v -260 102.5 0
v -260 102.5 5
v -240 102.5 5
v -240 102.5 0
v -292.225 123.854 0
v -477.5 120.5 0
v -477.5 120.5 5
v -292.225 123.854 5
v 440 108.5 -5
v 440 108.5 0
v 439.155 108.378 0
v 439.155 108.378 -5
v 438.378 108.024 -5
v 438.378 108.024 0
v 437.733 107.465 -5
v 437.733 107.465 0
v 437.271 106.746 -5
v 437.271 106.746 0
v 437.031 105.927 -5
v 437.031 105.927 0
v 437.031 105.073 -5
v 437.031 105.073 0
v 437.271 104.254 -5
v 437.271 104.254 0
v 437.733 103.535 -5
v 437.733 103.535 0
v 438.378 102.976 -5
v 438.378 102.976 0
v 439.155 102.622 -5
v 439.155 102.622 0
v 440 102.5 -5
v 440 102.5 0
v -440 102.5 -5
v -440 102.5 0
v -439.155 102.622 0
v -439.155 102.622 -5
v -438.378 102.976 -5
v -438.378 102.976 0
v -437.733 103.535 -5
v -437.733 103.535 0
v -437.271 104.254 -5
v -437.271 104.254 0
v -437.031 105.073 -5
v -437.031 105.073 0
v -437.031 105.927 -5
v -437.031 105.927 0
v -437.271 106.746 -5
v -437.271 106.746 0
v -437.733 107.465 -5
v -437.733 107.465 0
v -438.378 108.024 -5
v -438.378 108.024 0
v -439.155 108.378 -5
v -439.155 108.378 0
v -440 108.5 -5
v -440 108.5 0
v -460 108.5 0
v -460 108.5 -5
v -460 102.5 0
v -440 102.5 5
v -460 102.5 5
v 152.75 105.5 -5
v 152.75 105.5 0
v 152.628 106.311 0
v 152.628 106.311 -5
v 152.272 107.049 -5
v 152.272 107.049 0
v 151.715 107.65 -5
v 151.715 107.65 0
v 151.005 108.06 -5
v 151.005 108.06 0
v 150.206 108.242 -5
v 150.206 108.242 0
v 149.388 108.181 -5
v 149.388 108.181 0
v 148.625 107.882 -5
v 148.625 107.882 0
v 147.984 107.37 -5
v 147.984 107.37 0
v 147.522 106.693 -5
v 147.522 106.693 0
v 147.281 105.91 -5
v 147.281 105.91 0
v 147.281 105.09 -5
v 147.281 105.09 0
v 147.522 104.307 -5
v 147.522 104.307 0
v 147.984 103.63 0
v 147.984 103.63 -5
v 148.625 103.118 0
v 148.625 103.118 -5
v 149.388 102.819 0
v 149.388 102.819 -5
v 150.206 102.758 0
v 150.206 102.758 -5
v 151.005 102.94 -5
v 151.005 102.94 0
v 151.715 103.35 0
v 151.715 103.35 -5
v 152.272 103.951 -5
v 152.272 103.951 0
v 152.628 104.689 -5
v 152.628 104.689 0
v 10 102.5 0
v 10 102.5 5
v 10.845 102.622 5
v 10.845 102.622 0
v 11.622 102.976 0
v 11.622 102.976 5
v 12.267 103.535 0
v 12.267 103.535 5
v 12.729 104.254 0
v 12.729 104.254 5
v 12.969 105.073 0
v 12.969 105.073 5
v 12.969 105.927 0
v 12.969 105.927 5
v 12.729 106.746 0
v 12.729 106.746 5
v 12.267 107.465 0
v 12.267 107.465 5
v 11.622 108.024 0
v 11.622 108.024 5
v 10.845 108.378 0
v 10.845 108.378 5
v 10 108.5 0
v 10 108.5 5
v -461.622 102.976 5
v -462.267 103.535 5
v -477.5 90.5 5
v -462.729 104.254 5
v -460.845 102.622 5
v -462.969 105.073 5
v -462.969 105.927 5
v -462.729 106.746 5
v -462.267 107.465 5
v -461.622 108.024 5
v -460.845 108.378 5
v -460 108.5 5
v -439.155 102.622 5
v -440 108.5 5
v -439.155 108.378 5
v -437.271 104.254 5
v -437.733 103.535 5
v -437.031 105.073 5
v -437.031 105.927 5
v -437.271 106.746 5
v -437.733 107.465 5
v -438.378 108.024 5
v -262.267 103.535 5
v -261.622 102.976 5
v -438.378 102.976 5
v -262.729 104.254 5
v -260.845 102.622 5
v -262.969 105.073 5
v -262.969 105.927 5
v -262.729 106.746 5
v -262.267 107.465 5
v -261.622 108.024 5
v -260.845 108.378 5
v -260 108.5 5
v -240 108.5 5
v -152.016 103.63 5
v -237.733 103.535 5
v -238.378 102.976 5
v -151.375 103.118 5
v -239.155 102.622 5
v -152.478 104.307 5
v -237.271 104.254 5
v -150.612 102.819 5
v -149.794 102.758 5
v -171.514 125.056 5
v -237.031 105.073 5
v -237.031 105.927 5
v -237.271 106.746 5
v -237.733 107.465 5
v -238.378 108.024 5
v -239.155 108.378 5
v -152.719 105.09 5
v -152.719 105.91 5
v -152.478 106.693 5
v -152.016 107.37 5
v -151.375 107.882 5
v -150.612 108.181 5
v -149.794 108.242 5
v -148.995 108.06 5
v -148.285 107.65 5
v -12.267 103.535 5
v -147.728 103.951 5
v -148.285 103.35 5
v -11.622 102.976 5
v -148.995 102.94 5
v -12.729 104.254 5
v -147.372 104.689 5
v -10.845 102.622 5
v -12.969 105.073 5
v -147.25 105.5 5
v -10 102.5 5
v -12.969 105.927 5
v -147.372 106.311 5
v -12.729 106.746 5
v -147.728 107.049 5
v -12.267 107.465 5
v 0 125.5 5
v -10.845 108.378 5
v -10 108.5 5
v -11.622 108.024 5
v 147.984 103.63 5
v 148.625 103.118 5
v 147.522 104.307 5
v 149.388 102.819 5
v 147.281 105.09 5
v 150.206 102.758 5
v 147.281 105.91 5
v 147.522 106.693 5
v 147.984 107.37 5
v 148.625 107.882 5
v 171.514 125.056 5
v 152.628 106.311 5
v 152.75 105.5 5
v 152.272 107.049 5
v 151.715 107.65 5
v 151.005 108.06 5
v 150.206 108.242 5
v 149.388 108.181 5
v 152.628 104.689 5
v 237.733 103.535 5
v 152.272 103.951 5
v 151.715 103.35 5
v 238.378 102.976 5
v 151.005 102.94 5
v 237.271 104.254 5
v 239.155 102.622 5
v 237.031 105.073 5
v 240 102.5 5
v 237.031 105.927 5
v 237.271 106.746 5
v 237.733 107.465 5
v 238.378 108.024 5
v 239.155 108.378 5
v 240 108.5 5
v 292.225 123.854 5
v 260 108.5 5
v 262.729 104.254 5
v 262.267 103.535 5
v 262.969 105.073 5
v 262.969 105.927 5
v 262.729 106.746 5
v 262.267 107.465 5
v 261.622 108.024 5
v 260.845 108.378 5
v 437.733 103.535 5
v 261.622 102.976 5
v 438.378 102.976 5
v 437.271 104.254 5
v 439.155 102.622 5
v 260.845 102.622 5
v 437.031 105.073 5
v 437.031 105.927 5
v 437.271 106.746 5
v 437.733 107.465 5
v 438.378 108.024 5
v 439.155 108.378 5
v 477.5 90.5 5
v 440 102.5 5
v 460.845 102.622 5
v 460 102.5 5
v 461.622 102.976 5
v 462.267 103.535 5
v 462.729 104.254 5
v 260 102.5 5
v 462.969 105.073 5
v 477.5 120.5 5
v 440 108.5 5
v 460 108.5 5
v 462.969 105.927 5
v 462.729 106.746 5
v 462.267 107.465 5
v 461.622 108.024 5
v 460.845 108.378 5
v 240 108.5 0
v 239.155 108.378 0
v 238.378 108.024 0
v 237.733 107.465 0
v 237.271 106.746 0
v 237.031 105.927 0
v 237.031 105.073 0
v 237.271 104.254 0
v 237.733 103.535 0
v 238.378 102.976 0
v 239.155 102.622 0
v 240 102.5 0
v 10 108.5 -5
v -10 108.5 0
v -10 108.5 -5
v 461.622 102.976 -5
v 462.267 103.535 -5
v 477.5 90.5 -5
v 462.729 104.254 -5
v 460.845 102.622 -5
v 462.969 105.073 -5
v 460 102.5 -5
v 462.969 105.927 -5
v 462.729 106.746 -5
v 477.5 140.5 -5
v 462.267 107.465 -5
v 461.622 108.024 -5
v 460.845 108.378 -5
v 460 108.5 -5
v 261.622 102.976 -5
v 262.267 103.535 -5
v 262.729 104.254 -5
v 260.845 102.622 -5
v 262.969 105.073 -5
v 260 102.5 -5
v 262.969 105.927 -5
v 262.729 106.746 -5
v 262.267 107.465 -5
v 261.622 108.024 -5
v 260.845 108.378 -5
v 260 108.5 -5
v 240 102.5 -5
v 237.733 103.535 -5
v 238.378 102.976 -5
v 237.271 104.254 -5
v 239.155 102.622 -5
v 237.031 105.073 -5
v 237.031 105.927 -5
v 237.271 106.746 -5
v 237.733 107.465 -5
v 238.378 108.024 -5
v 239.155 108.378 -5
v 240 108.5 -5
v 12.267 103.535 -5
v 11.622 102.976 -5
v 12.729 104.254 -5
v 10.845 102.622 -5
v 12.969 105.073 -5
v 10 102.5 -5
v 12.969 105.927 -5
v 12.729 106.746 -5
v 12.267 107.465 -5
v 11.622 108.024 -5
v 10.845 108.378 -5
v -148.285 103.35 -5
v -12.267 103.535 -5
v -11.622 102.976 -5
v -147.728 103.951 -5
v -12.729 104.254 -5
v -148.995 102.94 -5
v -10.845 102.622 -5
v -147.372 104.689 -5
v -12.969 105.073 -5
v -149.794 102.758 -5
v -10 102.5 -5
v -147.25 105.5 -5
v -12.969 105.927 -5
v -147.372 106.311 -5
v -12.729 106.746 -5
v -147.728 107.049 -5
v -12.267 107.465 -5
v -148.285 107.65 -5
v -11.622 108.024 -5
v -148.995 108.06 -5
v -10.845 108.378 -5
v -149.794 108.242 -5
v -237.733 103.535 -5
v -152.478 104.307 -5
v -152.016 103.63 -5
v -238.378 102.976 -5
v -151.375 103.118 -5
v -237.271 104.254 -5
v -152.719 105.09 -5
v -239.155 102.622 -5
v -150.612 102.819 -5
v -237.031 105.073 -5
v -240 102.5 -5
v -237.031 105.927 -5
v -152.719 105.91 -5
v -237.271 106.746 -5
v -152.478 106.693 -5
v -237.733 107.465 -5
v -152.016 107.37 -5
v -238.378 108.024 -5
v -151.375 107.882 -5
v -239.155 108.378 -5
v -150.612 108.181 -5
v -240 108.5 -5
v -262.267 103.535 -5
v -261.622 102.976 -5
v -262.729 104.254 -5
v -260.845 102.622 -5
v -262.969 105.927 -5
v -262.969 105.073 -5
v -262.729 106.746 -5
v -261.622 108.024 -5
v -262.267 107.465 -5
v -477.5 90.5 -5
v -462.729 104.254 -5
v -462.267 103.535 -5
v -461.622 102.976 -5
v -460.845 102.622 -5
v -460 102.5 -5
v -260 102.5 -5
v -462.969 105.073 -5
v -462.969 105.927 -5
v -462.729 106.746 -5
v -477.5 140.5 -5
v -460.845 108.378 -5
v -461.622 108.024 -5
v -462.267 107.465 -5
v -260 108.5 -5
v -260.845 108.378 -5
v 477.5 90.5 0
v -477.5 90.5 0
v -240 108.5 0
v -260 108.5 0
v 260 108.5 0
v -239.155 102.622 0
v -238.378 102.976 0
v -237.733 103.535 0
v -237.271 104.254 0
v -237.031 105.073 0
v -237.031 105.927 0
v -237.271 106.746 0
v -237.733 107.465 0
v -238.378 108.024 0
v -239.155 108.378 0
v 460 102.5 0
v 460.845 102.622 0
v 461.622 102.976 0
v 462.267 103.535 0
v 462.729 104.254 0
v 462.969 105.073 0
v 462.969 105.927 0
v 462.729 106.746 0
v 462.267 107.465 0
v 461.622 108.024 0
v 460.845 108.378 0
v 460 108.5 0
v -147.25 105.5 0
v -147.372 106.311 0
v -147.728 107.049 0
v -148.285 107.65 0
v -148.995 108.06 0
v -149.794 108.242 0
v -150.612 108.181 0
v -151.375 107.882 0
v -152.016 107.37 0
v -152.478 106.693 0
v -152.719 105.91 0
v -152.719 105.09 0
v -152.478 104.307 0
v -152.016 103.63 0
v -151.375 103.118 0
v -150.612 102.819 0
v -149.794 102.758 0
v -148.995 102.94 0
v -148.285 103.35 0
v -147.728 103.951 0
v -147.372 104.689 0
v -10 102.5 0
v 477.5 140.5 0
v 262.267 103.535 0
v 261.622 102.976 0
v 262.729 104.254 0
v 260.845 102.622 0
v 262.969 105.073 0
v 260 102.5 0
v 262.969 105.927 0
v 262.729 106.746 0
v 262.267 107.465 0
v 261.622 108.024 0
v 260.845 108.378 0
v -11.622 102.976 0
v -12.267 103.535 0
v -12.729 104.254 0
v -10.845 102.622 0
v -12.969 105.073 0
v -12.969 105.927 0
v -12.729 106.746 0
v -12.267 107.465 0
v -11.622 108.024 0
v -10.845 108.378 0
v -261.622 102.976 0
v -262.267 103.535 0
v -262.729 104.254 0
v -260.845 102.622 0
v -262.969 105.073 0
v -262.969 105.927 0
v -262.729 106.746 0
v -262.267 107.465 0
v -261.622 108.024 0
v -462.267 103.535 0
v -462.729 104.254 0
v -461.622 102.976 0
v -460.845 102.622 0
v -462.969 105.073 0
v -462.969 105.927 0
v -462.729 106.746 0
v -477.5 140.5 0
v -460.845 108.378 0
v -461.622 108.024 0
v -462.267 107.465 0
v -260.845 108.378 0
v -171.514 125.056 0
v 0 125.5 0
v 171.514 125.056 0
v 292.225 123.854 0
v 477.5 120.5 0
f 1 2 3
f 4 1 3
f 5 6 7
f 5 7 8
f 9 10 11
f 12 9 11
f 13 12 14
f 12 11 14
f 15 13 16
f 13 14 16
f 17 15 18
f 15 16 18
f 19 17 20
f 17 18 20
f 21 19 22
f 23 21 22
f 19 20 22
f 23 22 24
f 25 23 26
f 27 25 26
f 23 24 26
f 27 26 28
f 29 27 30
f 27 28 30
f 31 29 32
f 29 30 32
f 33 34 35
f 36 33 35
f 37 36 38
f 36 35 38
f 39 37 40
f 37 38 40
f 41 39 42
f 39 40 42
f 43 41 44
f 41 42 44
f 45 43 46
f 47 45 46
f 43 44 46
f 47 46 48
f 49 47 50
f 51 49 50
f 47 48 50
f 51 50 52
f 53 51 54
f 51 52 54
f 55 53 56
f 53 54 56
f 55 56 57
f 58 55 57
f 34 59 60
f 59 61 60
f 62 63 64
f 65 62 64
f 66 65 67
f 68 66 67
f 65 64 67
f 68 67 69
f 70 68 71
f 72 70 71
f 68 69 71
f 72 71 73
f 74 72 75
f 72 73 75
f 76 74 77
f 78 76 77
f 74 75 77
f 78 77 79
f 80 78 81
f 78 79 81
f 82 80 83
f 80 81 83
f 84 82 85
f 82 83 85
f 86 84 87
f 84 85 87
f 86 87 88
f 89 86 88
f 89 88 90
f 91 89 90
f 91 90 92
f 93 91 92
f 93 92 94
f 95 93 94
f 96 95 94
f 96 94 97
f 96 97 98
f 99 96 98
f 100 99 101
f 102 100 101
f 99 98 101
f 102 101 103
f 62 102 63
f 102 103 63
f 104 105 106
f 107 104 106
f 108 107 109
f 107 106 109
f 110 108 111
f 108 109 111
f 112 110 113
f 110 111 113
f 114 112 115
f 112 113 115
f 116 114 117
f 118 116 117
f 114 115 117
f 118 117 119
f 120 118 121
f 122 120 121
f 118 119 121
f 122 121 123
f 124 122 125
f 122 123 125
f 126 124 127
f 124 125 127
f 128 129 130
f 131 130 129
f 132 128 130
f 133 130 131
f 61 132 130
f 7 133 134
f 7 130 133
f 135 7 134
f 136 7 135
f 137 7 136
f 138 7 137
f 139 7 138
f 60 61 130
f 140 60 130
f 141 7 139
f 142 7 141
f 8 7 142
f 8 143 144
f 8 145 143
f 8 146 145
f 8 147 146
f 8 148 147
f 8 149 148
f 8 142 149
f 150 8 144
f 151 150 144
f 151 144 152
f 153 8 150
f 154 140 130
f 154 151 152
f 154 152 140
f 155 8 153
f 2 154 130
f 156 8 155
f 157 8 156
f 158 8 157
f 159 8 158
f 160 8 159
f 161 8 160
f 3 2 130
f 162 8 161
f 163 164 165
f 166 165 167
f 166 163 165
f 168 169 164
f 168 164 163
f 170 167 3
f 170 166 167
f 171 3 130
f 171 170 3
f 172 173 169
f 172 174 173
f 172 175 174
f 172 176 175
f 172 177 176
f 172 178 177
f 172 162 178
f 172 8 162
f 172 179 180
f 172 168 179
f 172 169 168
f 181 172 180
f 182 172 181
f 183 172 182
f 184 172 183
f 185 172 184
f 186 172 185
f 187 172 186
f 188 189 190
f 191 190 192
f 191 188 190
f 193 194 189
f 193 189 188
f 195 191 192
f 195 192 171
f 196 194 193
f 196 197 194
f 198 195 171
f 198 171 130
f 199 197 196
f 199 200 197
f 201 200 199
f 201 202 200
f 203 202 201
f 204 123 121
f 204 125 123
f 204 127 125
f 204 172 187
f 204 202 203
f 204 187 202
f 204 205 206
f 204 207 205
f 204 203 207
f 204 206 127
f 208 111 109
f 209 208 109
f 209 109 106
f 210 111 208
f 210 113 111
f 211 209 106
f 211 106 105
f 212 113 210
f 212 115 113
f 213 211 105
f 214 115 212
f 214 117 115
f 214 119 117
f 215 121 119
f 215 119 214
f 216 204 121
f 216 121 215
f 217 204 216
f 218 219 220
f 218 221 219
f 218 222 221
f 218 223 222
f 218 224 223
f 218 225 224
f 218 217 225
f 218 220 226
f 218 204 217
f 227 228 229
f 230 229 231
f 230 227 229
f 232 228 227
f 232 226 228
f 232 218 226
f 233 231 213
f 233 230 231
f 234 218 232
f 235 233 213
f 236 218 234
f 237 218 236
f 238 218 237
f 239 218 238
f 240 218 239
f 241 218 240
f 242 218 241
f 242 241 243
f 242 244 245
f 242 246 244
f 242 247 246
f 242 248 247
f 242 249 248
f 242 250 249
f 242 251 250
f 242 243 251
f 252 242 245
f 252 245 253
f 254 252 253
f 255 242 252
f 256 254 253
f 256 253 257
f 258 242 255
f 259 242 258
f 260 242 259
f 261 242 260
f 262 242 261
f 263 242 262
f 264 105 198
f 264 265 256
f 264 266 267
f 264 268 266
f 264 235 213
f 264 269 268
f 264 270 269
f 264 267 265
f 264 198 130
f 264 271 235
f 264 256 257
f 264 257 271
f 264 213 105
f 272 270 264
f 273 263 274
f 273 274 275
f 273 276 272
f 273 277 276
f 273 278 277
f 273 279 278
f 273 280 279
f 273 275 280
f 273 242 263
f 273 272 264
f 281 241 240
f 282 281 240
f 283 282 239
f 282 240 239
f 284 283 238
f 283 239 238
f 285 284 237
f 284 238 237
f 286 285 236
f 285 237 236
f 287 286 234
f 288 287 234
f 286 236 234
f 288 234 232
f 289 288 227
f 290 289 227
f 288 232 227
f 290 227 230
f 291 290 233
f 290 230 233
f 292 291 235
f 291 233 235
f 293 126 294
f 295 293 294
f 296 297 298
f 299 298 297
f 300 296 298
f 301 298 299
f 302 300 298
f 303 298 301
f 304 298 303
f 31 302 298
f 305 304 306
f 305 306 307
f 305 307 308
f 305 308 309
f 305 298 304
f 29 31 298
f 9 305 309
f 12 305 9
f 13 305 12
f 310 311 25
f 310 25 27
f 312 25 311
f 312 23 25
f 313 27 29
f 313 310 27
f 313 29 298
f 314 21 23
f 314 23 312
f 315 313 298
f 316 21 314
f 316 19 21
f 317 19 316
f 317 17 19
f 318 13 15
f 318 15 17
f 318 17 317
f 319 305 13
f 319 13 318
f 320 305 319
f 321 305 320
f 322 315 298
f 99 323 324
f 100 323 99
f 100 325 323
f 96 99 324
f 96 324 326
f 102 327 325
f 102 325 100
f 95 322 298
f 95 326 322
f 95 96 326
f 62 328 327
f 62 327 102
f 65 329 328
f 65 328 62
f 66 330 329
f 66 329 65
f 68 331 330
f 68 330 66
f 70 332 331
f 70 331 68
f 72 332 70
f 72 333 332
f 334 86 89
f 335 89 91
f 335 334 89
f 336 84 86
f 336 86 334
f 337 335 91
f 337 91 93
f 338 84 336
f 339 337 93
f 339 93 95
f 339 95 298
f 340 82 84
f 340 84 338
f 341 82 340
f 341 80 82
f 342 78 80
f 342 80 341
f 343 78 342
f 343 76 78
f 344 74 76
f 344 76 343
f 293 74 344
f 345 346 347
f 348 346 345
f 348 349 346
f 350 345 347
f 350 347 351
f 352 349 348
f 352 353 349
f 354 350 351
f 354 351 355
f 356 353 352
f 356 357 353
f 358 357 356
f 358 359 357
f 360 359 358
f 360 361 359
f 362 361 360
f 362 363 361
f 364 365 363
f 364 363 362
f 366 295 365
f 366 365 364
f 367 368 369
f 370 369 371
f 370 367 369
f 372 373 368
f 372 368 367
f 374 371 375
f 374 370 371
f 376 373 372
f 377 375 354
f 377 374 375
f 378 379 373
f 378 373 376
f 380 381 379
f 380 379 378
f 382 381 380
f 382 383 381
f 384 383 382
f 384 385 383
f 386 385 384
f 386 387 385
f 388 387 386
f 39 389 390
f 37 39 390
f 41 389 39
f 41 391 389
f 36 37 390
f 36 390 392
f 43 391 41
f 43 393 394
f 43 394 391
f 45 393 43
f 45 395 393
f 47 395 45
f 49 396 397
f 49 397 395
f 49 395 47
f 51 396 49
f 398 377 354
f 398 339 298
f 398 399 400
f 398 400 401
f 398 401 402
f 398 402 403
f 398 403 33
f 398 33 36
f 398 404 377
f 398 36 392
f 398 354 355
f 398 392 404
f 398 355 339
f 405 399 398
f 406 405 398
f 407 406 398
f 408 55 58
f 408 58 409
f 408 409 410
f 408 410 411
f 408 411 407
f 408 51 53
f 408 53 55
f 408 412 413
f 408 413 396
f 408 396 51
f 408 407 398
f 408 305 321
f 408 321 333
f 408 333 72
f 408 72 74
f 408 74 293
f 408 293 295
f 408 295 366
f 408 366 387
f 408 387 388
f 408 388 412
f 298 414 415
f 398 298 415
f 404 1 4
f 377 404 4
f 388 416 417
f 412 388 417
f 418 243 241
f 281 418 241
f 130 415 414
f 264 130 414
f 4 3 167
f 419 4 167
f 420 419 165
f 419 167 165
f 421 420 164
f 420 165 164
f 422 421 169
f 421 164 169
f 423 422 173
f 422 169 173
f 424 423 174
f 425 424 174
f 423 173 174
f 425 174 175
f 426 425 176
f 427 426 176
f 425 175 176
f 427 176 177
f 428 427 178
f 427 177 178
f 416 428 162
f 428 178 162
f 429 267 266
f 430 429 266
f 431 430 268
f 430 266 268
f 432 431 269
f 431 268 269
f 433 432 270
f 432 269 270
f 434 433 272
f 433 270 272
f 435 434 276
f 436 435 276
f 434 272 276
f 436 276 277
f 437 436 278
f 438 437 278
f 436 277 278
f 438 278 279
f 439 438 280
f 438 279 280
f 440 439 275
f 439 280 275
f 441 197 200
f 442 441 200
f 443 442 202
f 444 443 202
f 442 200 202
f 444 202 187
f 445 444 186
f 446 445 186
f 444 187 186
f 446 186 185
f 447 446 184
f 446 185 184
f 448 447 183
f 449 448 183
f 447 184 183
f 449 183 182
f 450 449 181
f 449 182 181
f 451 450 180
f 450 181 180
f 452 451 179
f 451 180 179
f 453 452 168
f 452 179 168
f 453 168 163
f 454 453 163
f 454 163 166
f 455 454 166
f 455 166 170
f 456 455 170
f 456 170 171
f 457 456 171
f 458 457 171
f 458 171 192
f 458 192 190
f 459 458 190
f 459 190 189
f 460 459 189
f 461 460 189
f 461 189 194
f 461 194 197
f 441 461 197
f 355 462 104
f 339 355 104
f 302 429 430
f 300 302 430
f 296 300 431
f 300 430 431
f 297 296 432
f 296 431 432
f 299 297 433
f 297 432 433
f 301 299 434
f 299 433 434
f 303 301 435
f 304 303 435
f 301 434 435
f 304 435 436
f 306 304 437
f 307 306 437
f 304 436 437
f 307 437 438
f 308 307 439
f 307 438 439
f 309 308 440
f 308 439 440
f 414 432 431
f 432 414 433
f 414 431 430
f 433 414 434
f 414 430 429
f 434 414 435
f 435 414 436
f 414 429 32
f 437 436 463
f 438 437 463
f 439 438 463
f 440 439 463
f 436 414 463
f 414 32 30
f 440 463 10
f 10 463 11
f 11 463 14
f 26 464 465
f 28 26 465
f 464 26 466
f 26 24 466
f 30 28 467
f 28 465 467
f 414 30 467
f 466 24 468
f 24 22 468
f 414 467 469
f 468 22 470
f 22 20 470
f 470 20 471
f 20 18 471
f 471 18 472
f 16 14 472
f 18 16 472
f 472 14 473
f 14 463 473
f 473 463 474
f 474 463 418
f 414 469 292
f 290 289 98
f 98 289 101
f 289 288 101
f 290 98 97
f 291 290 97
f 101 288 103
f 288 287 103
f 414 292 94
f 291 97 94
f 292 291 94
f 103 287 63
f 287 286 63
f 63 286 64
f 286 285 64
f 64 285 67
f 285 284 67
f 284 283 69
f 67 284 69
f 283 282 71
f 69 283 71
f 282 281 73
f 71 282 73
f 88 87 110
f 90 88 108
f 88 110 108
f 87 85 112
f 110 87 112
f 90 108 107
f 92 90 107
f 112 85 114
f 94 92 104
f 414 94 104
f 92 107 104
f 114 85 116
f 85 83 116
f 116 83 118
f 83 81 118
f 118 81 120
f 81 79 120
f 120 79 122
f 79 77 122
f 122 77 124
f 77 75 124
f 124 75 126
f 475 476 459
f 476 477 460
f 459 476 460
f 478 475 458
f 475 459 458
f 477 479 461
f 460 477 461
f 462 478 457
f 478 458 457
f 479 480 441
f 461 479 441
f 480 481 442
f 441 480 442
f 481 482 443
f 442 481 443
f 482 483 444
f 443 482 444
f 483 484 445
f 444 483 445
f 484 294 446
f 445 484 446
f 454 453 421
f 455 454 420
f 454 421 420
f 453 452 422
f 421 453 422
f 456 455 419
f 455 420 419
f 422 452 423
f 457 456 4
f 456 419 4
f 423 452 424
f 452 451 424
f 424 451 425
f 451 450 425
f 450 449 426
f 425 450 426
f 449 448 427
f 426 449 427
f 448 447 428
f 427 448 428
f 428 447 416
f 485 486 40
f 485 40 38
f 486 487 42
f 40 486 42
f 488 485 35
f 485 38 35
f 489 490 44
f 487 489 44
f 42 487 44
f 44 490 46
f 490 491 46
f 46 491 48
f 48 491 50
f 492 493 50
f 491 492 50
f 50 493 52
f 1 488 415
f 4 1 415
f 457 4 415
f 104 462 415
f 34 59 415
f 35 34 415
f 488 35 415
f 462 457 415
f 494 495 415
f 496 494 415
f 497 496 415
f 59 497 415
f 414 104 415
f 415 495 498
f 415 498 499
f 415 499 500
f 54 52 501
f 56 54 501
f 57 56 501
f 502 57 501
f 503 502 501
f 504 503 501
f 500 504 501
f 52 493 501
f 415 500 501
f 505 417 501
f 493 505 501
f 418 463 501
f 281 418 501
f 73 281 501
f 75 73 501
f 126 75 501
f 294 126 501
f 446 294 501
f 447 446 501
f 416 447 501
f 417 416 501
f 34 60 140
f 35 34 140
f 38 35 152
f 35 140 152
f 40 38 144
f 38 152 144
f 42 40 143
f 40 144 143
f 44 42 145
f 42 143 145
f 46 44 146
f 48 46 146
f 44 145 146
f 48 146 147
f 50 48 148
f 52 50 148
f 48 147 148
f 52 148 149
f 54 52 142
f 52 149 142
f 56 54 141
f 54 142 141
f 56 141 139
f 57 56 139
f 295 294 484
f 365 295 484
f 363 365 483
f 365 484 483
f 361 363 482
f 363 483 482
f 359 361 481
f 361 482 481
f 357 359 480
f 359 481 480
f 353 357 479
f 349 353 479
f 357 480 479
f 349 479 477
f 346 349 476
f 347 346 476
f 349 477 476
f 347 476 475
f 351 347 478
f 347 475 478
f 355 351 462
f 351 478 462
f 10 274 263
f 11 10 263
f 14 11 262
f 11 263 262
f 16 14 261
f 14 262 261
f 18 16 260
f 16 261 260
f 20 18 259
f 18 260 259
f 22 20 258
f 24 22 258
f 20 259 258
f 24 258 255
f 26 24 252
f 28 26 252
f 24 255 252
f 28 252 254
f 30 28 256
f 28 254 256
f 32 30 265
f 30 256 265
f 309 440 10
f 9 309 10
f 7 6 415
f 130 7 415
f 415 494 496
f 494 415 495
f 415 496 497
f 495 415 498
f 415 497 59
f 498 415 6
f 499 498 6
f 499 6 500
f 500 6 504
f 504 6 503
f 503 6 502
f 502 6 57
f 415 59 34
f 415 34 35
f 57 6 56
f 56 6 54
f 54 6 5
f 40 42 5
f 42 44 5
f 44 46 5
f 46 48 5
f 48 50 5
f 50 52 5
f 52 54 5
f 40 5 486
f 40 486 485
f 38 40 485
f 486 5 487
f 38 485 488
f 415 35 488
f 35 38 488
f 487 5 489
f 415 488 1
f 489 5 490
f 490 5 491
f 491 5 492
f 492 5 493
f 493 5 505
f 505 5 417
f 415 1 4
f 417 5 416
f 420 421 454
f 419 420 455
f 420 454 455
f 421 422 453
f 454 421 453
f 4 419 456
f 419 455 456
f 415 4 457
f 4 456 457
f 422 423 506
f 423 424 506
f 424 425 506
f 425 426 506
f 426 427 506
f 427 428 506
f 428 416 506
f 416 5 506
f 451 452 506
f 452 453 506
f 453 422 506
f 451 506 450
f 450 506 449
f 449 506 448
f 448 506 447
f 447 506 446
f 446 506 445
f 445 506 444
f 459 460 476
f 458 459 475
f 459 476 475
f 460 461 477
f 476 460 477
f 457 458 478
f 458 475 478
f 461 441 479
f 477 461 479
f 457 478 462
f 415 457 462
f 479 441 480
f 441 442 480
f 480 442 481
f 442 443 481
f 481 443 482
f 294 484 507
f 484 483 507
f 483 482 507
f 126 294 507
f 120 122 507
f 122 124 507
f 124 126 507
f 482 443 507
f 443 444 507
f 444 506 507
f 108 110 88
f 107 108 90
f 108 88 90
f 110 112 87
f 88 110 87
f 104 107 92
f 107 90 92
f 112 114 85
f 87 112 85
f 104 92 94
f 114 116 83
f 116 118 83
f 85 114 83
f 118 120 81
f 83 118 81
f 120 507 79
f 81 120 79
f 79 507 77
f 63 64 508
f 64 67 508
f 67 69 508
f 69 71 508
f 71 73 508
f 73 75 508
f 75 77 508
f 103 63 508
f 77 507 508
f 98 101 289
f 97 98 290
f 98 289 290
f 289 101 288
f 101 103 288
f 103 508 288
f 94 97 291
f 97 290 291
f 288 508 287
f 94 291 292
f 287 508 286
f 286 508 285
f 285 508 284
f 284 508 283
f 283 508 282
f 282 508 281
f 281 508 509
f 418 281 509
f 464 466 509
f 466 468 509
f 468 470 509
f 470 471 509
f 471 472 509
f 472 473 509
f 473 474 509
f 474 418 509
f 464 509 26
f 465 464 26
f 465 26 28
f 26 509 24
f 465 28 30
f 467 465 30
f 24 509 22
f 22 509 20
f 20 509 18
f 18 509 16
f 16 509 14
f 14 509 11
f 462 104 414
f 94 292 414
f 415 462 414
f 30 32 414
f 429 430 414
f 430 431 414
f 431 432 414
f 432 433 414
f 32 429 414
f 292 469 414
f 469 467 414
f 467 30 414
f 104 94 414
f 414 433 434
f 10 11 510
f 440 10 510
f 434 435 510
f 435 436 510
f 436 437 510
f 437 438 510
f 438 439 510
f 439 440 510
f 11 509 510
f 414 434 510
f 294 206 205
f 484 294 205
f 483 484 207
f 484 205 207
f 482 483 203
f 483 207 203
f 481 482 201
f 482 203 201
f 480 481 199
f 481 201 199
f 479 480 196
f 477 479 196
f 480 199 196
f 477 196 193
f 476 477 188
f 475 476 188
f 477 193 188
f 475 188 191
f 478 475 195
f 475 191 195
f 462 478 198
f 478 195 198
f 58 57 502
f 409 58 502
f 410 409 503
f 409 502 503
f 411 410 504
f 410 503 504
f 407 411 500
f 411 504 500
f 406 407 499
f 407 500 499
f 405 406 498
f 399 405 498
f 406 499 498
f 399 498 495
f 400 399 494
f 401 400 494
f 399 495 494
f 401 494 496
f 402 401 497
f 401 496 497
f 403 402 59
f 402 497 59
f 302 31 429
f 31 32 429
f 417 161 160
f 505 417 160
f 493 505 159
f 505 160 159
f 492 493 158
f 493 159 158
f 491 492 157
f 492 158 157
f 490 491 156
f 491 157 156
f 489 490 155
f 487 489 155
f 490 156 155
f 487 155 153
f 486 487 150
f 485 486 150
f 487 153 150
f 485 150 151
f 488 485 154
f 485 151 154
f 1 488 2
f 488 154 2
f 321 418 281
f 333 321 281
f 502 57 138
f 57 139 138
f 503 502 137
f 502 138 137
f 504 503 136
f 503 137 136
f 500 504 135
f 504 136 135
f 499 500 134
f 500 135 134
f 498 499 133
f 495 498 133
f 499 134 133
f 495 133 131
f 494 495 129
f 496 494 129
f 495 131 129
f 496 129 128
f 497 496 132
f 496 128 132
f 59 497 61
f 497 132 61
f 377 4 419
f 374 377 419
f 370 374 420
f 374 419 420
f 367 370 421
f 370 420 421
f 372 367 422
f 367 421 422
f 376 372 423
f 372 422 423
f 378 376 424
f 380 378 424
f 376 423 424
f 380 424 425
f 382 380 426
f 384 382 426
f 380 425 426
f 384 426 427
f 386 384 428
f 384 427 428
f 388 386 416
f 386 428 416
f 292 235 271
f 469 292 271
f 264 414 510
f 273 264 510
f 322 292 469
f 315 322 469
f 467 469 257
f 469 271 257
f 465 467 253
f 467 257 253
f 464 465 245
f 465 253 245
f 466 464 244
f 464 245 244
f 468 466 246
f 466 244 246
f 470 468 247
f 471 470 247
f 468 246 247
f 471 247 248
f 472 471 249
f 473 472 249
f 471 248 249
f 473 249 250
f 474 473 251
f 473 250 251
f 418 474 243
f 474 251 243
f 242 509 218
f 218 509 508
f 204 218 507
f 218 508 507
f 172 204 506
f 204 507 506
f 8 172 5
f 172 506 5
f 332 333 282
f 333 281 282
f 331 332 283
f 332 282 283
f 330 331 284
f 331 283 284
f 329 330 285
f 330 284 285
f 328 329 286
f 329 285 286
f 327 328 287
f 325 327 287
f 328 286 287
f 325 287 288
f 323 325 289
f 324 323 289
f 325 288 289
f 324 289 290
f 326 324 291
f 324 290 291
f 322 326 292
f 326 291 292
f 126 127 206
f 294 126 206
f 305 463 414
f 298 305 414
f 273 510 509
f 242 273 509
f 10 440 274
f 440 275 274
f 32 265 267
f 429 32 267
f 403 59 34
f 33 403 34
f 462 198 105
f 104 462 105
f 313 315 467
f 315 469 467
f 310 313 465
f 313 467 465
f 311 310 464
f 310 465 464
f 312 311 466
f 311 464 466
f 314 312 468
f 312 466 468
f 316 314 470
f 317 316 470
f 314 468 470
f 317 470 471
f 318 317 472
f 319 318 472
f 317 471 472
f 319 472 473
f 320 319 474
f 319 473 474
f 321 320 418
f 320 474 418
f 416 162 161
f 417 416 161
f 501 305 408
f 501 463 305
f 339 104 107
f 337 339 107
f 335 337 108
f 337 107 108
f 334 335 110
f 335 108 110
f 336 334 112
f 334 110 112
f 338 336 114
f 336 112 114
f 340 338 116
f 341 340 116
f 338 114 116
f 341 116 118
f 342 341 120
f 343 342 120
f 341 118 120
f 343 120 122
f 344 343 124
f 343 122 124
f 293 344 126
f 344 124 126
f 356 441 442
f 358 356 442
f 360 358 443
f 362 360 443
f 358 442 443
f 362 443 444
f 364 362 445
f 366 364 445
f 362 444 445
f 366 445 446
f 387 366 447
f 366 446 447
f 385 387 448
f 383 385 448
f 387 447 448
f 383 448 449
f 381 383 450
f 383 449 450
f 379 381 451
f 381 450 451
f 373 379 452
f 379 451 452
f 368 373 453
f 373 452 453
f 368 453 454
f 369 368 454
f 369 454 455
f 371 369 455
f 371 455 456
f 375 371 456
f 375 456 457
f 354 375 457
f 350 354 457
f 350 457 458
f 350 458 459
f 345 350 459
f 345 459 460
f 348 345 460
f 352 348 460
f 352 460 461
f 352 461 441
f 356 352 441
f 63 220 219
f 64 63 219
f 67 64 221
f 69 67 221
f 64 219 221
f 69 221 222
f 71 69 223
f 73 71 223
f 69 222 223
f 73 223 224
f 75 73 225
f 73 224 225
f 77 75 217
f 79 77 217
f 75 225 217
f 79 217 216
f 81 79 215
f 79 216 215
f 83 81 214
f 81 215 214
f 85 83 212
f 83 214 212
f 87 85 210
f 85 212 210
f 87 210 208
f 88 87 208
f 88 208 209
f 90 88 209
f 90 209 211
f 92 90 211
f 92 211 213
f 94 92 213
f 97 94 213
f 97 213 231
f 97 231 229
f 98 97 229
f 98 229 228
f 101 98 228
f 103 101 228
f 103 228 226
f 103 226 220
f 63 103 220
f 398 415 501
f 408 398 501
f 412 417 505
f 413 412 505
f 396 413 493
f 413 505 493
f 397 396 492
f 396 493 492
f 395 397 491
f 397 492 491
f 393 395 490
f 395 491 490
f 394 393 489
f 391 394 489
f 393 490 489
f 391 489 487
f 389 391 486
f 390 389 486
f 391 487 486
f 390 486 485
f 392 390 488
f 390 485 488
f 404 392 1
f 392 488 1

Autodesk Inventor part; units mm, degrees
ref_plane "YZ Plane" through (0, 0, 0) normal (1, 0, 0) x (0, 1, 0)
ref_plane "XZ Plane" through (0, 0, 0) normal (0, 1, 0) x (-1, 0, 0)
ref_plane "XY Plane" through (0, 0, 0) normal (0, 0, 1) x (1, 0, 0)
sketch "Sketch1" plane through (0, 0, 0) normal (0, 0, 1) x (1, 0, 0)
  line L0 (-327.5, -120) -> (327.5, -120) construction
  line L1 (327.5, -120) -> (327.5, 120) construction
  line L2 (181.0324, 120) -> (-327.5, 120) construction
  line L3 (-327.5, 120) -> (-327.5, -120) construction
  line L4 (-327.5, -120) -> (327.5, 120) construction
  line L5 (327.5, -120) -> (-327.5, 120) construction
  line L6 (-327.5, 120) -> (-327.5, 122.5) construction
  line L7 (-145.4605, 120) -> (327.5, 120) construction
  line L8 (327.5, 120) -> (327.5, 125.5) construction
  line L9 (327.5, 125.5) -> (-327.5, 125.5) construction
  line L10 (-327.5, 125.5) -> (-327.5, 120) construction
  line L11 (-363.5951, 121.3114) -> (-639.7444, 121.118)
  line L12 (-327.5, 122.5) -> (-344.4955, 122.5)
  ellipse E0 centre (0, 122.5) end of major axis (-327.5, 122.5) minor radius 3 (327.5, 122.5) -> (-327.5, 122.5) ccw
  line L13 (-477.5, 120.5) -> (-292.2253, 123.8544)
  line L14 (-477.5, 120.5) -> (-477.5, 90.5)
  line L15 (-477.5, 90.5) -> (477.5, 90.5)
  line L16 (477.5, 90.5) -> (477.5, 120.5)
  line L17 (477.5, 120.5) -> (292.2253, 123.8544)
  point P0 (0, 0)
  dimension "d1" = 240
  dimension "d2" = 2.5
  dimension "d3" = 5.5
  dimension "d31" = 3
  dimension "d32" = 655
  dimension "d36" = 30
  dimension "d37" = 150
  dimension "d38" = 150
  dimension "d39" = 5
extrude "Extrusion1" add sketch "Sketch1" along normal blind 5
sketch "Sketch9" plane through (0, 0, 0) normal (0, 0, -1) x (-1, 0, 0)
  line L0 (477.5, 120.5) -> (292.2253, 123.8544) projected
  ellipse E0 centre (0, 122.5) end of major axis (-327.5, 122.5) minor radius 3 (292.2253, 123.8544) -> (-292.2253, 123.8544) ccw projected
  line L1 (-292.2253, 123.8544) -> (-477.5, 120.5) projected
  line L2 (-477.5, 120.5) -> (-477.5, 90.5) projected
  line L3 (-477.5, 90.5) -> (477.5, 90.5) projected
  line L4 (477.5, 90.5) -> (477.5, 120.5) projected
  line L5 (477.5, 120.5) -> (477.5, 90.5) projected
  line L6 (477.5, 90.5) -> (-477.5, 90.5)
  line L7 (-477.5, 90.5) -> (-477.5, 140.5)
  line L8 (-477.5, 140.5) -> (477.5, 140.5)
  line L9 (477.5, 140.5) -> (477.5, 90.5)
  point P0 (0, 0)
  dimension "d40" = 50
extrude "Extrusion7" add sketch "Sketch9" along normal blind 5 separate body
sketch "Sketch10" plane through (0, 0, 5) normal (0, 0, 1) x (1, 0, 0)
  line L0 (-10, 105.5) -> (10, 105.5) construction
  line L1 (-10, 102.5) -> (10, 102.5)
  line L2 (10, 108.5) -> (-10, 108.5)
  arc A0 (-10, 108.5) -> (-10, 102.5) centre (-10, 105.5) ccw
  arc A1 (10, 102.5) -> (10, 108.5) centre (10, 105.5) ccw
  line L3 (240, 105.5) -> (260, 105.5) construction
  line L4 (240, 102.5) -> (260, 102.5)
  line L5 (260, 108.5) -> (240, 108.5)
  arc A2 (240, 108.5) -> (240, 102.5) centre (240, 105.5) ccw
  arc A3 (260, 102.5) -> (260, 108.5) centre (260, 105.5) ccw
  line L6 (-260, 105.5) -> (-240, 105.5) construction
  line L7 (-260, 102.5) -> (-240, 102.5)
  line L8 (-240, 108.5) -> (-260, 108.5)
  arc A4 (-260, 108.5) -> (-260, 102.5) centre (-260, 105.5) ccw
  arc A5 (-240, 102.5) -> (-240, 108.5) centre (-240, 105.5) ccw
  line L9 (-477.5, 90.5) -> (477.5, 90.5) projected
  circle A6 centre (-150, 105.5) radius 2.75
  circle A7 centre (150, 105.5) radius 2.75
  line L10 (-460, 105.5) -> (-440, 105.5) construction
  line L11 (-460, 102.5) -> (-440, 102.5)
  line L12 (-440, 108.5) -> (-460, 108.5)
  arc A8 (-460, 108.5) -> (-460, 102.5) centre (-460, 105.5) ccw
  arc A9 (-440, 102.5) -> (-440, 108.5) centre (-440, 105.5) ccw
  line L13 (440, 105.5) -> (460, 105.5) construction
  line L14 (440, 102.5) -> (460, 102.5)
  line L15 (460, 108.5) -> (440, 108.5)
  arc A10 (440, 108.5) -> (440, 102.5) centre (440, 105.5) ccw
  arc A11 (460, 102.5) -> (460, 108.5) centre (460, 105.5) ccw
  point P0 (0, 0)
  point P1 (0, 105.5)
  point P2 (250, 105.5)
  point P3 (-250, 105.5)
  point P4 (-450, 105.5)
  point P5 (450, 105.5)
  dimension "d43" = 10
  dimension "d44" = 6
  dimension "d45" = 250
  dimension "d46" = 250
  dimension "d47" = 15
  dimension "d50" = 5.5
  dimension "d51" = 150
  dimension "d52" = 150
  dimension "d53" = 200
  dimension "d54" = 200
extrude "Extrusion8" cut sketch "Sketch10" against normal through all bodies 1 2
equation "\"d38\" = d37"
equation "\"d45\" = d46"
properties part number "Guia eliptica"
